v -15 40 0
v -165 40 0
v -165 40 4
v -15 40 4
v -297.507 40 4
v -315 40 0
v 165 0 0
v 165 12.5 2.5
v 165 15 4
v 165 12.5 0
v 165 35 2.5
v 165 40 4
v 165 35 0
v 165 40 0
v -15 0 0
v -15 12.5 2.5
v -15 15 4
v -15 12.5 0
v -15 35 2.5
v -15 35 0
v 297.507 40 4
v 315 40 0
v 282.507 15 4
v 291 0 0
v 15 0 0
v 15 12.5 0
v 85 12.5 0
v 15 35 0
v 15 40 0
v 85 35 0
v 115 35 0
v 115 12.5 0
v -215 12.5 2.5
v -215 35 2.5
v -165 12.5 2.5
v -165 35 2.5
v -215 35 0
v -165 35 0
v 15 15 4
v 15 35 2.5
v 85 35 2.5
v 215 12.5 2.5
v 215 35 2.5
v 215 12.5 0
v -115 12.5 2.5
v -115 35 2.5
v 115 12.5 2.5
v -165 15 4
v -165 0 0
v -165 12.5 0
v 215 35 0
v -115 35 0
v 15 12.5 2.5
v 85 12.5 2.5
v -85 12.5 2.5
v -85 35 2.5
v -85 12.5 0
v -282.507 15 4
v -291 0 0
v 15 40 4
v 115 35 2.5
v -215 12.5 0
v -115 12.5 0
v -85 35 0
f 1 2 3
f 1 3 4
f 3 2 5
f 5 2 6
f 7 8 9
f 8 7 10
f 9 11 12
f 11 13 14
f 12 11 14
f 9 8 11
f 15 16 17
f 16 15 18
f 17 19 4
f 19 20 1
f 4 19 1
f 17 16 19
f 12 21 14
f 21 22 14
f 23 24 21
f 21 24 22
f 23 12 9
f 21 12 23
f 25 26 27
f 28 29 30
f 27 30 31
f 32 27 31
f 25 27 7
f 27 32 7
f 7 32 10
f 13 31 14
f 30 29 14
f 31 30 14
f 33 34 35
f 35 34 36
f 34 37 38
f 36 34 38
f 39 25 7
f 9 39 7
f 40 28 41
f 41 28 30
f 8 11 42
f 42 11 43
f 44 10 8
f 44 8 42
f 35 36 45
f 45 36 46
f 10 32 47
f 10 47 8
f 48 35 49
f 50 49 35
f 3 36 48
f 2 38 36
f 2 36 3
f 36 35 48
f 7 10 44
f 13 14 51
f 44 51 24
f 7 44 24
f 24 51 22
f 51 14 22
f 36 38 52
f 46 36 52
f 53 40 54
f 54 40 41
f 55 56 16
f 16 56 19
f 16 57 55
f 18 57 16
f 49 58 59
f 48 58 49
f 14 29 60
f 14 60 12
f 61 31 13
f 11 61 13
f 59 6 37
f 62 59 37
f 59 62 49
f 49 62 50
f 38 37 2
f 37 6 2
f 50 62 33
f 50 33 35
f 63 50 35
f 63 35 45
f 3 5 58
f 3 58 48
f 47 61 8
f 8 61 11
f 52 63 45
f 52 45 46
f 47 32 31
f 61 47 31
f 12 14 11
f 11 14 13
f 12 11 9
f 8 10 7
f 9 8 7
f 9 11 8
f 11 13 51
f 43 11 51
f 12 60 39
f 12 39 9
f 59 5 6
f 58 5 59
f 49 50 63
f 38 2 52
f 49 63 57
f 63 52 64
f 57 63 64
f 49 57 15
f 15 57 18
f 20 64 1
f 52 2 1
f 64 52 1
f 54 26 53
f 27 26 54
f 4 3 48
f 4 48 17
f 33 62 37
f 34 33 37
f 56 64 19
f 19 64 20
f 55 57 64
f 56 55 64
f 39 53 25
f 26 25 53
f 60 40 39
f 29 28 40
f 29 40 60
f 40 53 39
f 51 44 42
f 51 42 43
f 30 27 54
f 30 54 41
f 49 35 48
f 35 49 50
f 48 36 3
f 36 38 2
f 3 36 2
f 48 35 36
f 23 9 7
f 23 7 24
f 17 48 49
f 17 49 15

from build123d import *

# Parameters (mm, degrees)
F1_DEPTH   = 4
F0_W       = 150
F0_H       = 40
F2_DEPTH   = 4
F3_SIZE2   = 3.99999
F3_SIZE    = 14.99999
F3_2_SIZE2 = 3.99999
F3_2_SIZE  = 14.99999
F4_SIZE2   = 14.99999
F4_SIZE    = 3.99999
F4_2_SIZE2 = 14.99999
F4_2_SIZE  = 3.99999
F4_3_SIZE2 = 14.99999
F4_3_SIZE  = 3.99999
F5_W       = 100
F5_H       = 22.5
F5_W_2     = 70
F6_DEPTH   = 2.5


# Not quite as in the source:
# - a fillet or chamfer is up to 0.001 mm smaller than in the source, because OpenCascade refuses the exact size


with BuildPart() as f1:
    # F0 (on Top) → F1 (new body)
    with BuildSketch(Plane.XY):
        Polygon((-291, 0), (-165, 0), (-165, 40), (-315, 40), align=None)
    extrude(amount=F1_DEPTH)

    # F4 (size 4 and 15 in the source; OpenCascade refuses exactly that, so slightly less here)
    f4_edges = [f1.edges().sort_by_distance(p)[0] for p in [
        (-228, 0, 4),
        (-303, 20, 4),
    ]]
    chamfer(f4_edges, length=F4_SIZE, length2=F4_SIZE2)


with BuildPart() as f1b:
    # F0 (on Top) → F1, piece 2 (new body)
    with BuildSketch(Plane.XY):
        Polygon((165, 40), (165, 0), (291, 0), (315, 40), align=None)
    extrude(amount=F1_DEPTH)

    # F3#2 (size 15 and 4 in the source; OpenCascade refuses exactly that, so slightly less here)
    f3_2_edges = [f1b.edges().sort_by_distance(p)[0] for p in [
        (303, 20, 4),
    ]]
    f3_2_side = f1b.faces().sort_by_distance((234.173913, 20.57971, 4))[0]
    chamfer(f3_2_edges, length=F3_2_SIZE, length2=F3_2_SIZE2, reference=f3_2_side)

    # F4#3 (size 4 and 15 in the source; OpenCascade refuses exactly that, so slightly less here)
    f4_3_edges = [f1b.edges().sort_by_distance(p)[0] for p in [
        (219.253578, 0, 4),
    ]]
    chamfer(f4_3_edges, length=F4_3_SIZE, length2=F4_3_SIZE2)


with BuildPart() as f2:
    # F0 (on Top) → F2 (new body)
    with BuildSketch(Plane.XY):
        with Locations((-90, 20)):
            Rectangle(F0_W, F0_H)
    extrude(amount=F2_DEPTH)

    # F4#2 (size 4 and 15 in the source; OpenCascade refuses exactly that, so slightly less here)
    f4_2_edges = [f2.edges().sort_by_distance(p)[0] for p in [
        (-90, 0, 4),
    ]]
    chamfer(f4_2_edges, length=F4_2_SIZE, length2=F4_2_SIZE2)


with BuildPart() as f2b:
    # F0 (on Top) → F2, piece 2 (new body)
    with BuildSketch(Plane.XY):
        with Locations((90, 20)):
            Rectangle(F0_W, F0_H)
    extrude(amount=F2_DEPTH)

    # F3 (size 15 and 4 in the source; OpenCascade refuses exactly that, so slightly less here)
    f3_edges = [f2b.edges().sort_by_distance(p)[0] for p in [
        (90, 0, 4),
    ]]
    f3_side = f2b.faces().sort_by_distance((90, 20, 4))[0]
    chamfer(f3_edges, length=F3_SIZE, length2=F3_SIZE2, reference=f3_side)


with BuildPart() as f6_tool:
    # F5 (on face) → F6 (new body)
    with BuildSketch(Plane.XY):
        with Locations((165, 23.75)):
            Rectangle(F5_W, F5_H)
        with Locations((50, 23.75)):
            Rectangle(F5_W_2, F5_H)
        with Locations((-165, 23.75)):
            Rectangle(F5_W, F5_H)
        with Locations((-50, 23.75)):
            Rectangle(F5_W_2, F5_H)
    extrude(amount=F6_DEPTH)


with BuildPart() as f1_1:
    add(f1.part)

    # F6: cut by f6_tool
    add(f6_tool.part, mode=Mode.SUBTRACT)


with BuildPart() as f1b_1:
    add(f1b.part)

    # F6: cut by f6_tool
    add(f6_tool.part, mode=Mode.SUBTRACT)


with BuildPart() as f2_1:
    add(f2.part)

    # F6: cut by f6_tool
    add(f6_tool.part, mode=Mode.SUBTRACT)


with BuildPart() as f2b_1:
    add(f2b.part)

    # F6: cut by f6_tool
    add(f6_tool.part, mode=Mode.SUBTRACT)


solid = Compound([f1_1.part, f1b_1.part, f2_1.part, f2b_1.part])
